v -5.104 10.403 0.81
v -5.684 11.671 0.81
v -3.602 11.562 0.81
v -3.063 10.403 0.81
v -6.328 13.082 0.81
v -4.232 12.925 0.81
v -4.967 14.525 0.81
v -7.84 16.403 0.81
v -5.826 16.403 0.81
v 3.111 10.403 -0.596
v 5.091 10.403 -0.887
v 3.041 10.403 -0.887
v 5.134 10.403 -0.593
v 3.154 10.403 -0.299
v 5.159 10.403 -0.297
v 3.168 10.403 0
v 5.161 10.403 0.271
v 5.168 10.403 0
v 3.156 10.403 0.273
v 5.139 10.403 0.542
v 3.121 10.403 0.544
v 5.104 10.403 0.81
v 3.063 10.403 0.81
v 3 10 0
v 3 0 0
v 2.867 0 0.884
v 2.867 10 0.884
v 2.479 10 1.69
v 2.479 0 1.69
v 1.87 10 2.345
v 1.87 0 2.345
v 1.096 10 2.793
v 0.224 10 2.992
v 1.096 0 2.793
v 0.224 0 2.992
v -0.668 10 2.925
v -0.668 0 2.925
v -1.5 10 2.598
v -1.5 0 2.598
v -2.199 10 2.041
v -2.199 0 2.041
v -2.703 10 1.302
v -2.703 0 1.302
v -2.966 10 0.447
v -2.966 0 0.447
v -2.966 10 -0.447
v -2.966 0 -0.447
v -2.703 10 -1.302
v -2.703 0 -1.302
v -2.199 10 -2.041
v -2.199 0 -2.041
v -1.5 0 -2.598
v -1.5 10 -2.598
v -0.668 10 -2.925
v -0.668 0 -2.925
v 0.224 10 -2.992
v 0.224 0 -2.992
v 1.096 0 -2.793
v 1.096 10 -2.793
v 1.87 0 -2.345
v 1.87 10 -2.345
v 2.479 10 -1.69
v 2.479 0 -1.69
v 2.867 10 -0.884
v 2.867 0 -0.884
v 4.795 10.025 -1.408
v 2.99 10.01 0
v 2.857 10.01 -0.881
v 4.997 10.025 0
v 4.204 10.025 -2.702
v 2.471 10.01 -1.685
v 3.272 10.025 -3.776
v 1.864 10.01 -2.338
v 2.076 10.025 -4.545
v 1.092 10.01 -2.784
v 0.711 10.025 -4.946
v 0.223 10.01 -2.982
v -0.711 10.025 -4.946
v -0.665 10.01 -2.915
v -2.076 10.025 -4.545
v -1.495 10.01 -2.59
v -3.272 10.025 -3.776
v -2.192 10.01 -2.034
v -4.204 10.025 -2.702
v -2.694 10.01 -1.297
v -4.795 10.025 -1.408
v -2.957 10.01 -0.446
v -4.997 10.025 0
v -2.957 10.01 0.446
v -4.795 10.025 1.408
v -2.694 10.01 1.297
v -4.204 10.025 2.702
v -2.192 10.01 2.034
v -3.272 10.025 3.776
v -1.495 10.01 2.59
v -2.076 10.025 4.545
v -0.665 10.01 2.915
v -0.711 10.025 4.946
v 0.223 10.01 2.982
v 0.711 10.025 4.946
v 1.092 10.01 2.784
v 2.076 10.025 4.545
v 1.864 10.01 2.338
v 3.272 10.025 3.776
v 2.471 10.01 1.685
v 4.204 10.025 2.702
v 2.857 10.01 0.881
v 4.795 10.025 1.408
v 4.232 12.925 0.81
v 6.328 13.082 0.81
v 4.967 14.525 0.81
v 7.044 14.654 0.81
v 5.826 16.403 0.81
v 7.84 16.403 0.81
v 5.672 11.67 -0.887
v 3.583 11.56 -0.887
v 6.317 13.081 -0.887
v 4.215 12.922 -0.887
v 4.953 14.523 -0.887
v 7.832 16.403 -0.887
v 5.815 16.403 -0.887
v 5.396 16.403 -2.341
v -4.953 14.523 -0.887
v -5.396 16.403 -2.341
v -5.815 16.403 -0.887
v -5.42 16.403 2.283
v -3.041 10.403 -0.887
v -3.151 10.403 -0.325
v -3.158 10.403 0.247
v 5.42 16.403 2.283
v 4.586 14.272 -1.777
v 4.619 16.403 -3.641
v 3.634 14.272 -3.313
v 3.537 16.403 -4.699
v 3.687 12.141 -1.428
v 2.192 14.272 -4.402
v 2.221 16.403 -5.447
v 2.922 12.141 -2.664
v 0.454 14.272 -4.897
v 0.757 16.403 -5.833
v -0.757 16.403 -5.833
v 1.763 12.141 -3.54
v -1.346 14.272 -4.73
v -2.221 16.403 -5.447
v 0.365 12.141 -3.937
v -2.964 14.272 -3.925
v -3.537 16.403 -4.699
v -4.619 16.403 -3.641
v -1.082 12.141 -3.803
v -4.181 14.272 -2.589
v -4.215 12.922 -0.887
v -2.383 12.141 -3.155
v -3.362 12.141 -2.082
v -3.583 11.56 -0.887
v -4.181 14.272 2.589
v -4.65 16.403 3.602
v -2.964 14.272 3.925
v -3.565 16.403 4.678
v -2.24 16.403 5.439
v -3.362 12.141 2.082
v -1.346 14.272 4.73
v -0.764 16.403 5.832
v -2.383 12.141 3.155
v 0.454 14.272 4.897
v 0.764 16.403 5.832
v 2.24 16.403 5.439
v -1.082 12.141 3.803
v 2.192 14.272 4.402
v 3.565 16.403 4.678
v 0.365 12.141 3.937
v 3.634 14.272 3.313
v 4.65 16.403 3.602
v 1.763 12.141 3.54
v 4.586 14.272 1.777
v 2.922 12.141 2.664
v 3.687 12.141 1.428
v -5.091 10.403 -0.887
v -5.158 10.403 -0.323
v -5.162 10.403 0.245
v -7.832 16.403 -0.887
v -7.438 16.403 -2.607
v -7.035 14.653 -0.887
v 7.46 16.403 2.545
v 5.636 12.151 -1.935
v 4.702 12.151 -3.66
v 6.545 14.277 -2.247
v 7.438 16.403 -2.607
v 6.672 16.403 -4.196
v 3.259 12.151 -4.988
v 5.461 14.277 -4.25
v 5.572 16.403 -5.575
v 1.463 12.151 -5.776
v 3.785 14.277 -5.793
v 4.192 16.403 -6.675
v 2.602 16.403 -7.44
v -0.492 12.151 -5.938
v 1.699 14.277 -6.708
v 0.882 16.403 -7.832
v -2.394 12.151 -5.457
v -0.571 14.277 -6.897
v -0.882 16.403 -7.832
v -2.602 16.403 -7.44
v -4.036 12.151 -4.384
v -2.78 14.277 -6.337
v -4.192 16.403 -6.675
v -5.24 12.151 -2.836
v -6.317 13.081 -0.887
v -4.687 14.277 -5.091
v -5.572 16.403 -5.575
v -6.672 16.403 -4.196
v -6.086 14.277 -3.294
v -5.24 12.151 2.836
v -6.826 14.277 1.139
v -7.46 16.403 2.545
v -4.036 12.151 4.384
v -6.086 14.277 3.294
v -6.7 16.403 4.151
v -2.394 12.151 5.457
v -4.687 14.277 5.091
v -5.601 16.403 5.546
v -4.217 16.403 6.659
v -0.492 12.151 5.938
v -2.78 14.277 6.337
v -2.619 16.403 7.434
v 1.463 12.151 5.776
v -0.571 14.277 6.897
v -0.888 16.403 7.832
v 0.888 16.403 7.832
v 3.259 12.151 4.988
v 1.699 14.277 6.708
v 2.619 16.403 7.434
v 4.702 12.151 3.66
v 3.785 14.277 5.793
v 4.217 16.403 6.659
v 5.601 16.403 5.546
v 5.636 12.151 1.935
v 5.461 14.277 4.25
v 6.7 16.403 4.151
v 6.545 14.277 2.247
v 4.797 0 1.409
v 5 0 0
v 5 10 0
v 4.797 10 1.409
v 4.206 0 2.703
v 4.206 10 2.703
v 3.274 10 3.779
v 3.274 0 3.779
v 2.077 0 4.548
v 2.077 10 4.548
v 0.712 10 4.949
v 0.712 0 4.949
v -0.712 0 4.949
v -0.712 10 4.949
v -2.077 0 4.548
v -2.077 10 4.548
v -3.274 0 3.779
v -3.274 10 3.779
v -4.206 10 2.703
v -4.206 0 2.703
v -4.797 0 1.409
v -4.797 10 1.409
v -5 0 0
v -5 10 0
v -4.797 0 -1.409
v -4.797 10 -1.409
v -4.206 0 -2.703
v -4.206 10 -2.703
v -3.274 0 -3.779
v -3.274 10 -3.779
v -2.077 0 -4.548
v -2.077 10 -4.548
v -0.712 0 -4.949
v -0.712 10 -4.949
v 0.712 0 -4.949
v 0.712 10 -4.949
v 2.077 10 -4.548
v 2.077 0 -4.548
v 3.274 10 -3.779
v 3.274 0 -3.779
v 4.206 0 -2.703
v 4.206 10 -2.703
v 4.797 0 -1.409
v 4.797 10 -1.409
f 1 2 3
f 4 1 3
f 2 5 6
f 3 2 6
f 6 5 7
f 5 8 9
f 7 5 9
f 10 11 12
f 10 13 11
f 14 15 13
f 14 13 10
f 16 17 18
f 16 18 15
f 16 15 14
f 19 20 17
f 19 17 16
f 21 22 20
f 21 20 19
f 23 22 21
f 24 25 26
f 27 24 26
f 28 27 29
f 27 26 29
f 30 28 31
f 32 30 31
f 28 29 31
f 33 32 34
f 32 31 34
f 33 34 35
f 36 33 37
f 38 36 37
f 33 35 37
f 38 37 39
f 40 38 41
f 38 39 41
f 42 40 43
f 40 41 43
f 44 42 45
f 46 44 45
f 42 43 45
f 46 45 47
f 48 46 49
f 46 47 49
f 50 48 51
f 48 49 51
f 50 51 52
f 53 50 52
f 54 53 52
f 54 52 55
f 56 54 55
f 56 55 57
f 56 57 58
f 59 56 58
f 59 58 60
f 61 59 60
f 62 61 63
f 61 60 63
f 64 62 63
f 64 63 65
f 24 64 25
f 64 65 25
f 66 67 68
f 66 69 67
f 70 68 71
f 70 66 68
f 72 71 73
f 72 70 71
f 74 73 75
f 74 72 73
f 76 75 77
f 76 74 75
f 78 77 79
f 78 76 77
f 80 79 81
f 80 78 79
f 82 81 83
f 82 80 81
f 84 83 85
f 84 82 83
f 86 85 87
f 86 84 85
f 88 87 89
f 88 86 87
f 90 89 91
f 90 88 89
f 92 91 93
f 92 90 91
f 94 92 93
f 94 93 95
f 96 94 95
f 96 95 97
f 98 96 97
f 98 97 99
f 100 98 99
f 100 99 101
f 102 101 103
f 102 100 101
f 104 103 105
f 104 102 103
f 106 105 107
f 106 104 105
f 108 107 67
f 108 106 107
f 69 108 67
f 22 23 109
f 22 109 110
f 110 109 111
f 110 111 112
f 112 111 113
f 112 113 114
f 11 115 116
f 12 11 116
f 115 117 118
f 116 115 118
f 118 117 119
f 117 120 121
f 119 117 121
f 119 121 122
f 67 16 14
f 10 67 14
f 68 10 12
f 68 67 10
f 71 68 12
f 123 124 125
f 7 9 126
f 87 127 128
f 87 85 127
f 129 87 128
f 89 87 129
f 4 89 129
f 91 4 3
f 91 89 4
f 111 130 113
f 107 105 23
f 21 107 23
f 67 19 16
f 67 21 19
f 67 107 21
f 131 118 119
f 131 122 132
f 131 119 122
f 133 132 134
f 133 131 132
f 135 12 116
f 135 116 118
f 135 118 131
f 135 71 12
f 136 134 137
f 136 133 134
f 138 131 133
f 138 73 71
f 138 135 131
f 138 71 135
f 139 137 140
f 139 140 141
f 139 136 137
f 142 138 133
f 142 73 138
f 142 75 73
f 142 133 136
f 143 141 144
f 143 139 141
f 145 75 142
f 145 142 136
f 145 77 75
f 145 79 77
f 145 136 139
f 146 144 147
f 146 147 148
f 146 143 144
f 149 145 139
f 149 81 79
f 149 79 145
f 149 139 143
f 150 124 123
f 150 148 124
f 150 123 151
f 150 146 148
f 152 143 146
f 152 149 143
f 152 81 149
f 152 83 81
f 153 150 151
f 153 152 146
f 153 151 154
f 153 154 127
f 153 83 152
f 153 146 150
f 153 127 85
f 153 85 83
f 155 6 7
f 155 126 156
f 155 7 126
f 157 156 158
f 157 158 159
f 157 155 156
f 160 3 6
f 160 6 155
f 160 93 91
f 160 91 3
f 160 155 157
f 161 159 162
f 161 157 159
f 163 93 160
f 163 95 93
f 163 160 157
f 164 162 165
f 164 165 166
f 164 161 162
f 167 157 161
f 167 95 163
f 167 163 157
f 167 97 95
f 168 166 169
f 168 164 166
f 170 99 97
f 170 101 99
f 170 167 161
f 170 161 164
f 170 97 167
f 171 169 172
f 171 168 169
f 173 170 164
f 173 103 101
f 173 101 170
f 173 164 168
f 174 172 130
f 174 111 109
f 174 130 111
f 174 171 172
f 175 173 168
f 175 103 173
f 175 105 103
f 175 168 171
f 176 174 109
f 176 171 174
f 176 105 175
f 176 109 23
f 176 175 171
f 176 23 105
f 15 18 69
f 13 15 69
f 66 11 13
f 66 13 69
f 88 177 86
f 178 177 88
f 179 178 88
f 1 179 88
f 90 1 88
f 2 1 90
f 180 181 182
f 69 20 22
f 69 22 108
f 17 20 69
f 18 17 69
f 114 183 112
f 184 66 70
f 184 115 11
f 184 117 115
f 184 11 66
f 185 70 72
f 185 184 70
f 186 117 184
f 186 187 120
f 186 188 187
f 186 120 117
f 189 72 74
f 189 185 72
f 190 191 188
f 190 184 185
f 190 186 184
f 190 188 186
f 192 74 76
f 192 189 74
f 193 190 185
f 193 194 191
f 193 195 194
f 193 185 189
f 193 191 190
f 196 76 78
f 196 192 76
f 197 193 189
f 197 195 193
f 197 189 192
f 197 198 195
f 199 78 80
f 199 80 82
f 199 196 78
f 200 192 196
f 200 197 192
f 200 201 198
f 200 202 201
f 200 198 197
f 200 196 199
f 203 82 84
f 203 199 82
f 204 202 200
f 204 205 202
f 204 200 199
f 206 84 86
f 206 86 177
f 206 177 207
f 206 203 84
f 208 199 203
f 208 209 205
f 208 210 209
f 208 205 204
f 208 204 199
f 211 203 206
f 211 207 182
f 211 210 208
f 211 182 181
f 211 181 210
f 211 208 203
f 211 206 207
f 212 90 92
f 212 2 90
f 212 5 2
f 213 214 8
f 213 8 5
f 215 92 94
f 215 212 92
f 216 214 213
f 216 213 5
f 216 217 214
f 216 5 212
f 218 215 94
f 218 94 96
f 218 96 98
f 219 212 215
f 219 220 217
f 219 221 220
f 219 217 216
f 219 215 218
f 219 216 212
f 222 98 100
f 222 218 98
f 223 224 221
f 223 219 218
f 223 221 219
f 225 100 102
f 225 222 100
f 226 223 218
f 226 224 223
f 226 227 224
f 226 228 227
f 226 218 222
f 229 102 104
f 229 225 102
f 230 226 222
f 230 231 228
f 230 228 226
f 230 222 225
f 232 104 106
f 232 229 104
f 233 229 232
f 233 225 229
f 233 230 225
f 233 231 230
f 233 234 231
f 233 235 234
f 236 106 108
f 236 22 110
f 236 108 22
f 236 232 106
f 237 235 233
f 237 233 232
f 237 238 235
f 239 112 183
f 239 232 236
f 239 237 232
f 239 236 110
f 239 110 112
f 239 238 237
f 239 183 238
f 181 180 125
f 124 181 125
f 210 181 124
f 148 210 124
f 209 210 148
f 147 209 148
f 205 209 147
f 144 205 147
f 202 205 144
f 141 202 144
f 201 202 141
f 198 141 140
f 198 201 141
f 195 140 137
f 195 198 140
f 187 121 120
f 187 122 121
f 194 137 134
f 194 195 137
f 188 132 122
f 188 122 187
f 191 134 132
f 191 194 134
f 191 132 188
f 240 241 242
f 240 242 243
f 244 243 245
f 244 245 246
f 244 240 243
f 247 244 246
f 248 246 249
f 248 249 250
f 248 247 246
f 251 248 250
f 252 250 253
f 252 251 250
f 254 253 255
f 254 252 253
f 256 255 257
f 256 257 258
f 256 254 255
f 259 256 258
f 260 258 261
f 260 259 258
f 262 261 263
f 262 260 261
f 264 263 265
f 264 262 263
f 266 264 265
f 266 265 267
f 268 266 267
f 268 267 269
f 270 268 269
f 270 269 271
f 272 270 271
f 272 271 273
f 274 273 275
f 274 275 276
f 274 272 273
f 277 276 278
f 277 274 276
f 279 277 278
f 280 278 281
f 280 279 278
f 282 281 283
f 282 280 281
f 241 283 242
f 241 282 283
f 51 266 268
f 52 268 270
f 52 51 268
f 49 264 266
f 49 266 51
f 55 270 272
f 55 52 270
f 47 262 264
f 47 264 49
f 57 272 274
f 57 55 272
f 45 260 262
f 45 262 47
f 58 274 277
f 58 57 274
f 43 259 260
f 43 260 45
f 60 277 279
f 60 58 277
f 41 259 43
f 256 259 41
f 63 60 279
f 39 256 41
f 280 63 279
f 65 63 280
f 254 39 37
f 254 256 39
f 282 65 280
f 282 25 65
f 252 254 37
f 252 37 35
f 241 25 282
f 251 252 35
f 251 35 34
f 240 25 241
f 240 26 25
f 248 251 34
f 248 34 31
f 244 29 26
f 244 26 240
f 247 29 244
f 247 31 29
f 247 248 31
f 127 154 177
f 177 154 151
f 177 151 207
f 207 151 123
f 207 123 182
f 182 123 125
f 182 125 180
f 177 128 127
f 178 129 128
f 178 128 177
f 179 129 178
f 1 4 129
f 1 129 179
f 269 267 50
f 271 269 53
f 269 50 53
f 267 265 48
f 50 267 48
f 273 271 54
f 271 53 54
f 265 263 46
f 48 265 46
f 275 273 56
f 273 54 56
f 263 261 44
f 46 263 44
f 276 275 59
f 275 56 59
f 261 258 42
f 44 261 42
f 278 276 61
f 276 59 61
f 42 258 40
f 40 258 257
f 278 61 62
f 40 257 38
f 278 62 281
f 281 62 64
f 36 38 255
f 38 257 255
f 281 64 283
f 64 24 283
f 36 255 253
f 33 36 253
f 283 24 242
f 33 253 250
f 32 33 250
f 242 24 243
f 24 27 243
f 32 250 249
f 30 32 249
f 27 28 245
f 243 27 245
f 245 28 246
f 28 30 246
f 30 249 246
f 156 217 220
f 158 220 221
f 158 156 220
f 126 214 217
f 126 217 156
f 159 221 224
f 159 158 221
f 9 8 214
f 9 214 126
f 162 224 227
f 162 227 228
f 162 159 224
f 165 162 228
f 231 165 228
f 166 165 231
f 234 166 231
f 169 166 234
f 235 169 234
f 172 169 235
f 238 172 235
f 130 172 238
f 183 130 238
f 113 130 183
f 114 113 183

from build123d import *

# Parameters (mm, degrees)
F0_R     = 5
F0_R_2   = 3
F1_DEPTH = 10
F6_DEPTH = 6


with BuildPart() as f1:
    # F0 (on Front) → F1 (new body)
    with BuildSketch(Plane.XZ):
        Circle(F0_R)
        Circle(F0_R_2, mode=Mode.SUBTRACT)
    extrude(amount=-F1_DEPTH)


with BuildPart() as f4:
    # F3 (on Top) → F4 (revolve)
    with BuildSketch(Plane.XY):
        Polygon((2.990321, 10.010189), (4.996989, 10.024931), (7.881791, 16.402855), (5.881791, 16.402855), align=None)
    revolve(axis=Axis((0, 16.03541, 0), (0, 1, 0)))

    # F5 (on face) → F6 (cut)
    with BuildSketch(Plane(origin=(0, 16.402855, 0), x_dir=(-1, 0, 0), z_dir=(0, 1, 0))):
        with BuildLine():
            ThreePointArc((7.881791, 0), (7.87134, 0.405751), (7.840015, 0.810426))
            Line((7.840015, 0.810426), (5.825691, 0.810426))
            ThreePointArc((5.825691, 0.810426), (5.867749, 0.406183), (5.881791, 0))
            ThreePointArc((5.881791, 0), (5.864962, -0.444623), (5.81457, -0.886702))
            Line((5.81457, -0.886702), (7.831755, -0.886702))
            ThreePointArc((7.831755, -0.886702), (7.869272, -0.444056), (7.881791, 0))
        make_face()
        with BuildLine():
            Line((9.343737, 0.810426), (7.840015, 0.810426))
            ThreePointArc((7.840015, 0.810426), (7.87134, 0.405751), (7.881791, 0))
            ThreePointArc((7.881791, 0), (7.869272, -0.444056), (7.831755, -0.886702))
            Line((7.831755, -0.886702), (9.343737, -0.886702))
            Line((9.343737, -0.886702), (9.343737, 0.810426))
        make_face()
        with BuildLine():
            Line((5.825691, 0.810426), (-5.825691, 0.810426))
            ThreePointArc((-5.825691, 0.810426), (-5.881665, -0.038541), (-5.81457, -0.886702))
            Line((-5.81457, -0.886702), (5.81457, -0.886702))
            ThreePointArc((5.81457, -0.886702), (5.864962, -0.444623), (5.881791, 0))
            ThreePointArc((5.881791, 0), (5.867749, 0.406183), (5.825691, 0.810426))
        make_face()
        with BuildLine():
            Line((-5.825691, 0.810426), (-7.840015, 0.810426))
            ThreePointArc((-7.840015, 0.810426), (-7.881698, -0.038361), (-7.831755, -0.886702))
            Line((-7.831755, -0.886702), (-5.81457, -0.886702))
            ThreePointArc((-5.81457, -0.886702), (-5.881665, -0.038541), (-5.825691, 0.810426))
        make_face()
        with BuildLine():
            Line((-7.840015, 0.810426), (-8.809809, 0.810426))
            Line((-8.809809, 0.810426), (-8.809809, -0.886702))
            Line((-8.809809, -0.886702), (-7.831755, -0.886702))
            ThreePointArc((-7.831755, -0.886702), (-7.881698, -0.038361), (-7.840015, 0.810426))
        make_face()
    extrude(amount=-F6_DEPTH, mode=Mode.SUBTRACT)


solid = Compound([f1.part, f4.part])
